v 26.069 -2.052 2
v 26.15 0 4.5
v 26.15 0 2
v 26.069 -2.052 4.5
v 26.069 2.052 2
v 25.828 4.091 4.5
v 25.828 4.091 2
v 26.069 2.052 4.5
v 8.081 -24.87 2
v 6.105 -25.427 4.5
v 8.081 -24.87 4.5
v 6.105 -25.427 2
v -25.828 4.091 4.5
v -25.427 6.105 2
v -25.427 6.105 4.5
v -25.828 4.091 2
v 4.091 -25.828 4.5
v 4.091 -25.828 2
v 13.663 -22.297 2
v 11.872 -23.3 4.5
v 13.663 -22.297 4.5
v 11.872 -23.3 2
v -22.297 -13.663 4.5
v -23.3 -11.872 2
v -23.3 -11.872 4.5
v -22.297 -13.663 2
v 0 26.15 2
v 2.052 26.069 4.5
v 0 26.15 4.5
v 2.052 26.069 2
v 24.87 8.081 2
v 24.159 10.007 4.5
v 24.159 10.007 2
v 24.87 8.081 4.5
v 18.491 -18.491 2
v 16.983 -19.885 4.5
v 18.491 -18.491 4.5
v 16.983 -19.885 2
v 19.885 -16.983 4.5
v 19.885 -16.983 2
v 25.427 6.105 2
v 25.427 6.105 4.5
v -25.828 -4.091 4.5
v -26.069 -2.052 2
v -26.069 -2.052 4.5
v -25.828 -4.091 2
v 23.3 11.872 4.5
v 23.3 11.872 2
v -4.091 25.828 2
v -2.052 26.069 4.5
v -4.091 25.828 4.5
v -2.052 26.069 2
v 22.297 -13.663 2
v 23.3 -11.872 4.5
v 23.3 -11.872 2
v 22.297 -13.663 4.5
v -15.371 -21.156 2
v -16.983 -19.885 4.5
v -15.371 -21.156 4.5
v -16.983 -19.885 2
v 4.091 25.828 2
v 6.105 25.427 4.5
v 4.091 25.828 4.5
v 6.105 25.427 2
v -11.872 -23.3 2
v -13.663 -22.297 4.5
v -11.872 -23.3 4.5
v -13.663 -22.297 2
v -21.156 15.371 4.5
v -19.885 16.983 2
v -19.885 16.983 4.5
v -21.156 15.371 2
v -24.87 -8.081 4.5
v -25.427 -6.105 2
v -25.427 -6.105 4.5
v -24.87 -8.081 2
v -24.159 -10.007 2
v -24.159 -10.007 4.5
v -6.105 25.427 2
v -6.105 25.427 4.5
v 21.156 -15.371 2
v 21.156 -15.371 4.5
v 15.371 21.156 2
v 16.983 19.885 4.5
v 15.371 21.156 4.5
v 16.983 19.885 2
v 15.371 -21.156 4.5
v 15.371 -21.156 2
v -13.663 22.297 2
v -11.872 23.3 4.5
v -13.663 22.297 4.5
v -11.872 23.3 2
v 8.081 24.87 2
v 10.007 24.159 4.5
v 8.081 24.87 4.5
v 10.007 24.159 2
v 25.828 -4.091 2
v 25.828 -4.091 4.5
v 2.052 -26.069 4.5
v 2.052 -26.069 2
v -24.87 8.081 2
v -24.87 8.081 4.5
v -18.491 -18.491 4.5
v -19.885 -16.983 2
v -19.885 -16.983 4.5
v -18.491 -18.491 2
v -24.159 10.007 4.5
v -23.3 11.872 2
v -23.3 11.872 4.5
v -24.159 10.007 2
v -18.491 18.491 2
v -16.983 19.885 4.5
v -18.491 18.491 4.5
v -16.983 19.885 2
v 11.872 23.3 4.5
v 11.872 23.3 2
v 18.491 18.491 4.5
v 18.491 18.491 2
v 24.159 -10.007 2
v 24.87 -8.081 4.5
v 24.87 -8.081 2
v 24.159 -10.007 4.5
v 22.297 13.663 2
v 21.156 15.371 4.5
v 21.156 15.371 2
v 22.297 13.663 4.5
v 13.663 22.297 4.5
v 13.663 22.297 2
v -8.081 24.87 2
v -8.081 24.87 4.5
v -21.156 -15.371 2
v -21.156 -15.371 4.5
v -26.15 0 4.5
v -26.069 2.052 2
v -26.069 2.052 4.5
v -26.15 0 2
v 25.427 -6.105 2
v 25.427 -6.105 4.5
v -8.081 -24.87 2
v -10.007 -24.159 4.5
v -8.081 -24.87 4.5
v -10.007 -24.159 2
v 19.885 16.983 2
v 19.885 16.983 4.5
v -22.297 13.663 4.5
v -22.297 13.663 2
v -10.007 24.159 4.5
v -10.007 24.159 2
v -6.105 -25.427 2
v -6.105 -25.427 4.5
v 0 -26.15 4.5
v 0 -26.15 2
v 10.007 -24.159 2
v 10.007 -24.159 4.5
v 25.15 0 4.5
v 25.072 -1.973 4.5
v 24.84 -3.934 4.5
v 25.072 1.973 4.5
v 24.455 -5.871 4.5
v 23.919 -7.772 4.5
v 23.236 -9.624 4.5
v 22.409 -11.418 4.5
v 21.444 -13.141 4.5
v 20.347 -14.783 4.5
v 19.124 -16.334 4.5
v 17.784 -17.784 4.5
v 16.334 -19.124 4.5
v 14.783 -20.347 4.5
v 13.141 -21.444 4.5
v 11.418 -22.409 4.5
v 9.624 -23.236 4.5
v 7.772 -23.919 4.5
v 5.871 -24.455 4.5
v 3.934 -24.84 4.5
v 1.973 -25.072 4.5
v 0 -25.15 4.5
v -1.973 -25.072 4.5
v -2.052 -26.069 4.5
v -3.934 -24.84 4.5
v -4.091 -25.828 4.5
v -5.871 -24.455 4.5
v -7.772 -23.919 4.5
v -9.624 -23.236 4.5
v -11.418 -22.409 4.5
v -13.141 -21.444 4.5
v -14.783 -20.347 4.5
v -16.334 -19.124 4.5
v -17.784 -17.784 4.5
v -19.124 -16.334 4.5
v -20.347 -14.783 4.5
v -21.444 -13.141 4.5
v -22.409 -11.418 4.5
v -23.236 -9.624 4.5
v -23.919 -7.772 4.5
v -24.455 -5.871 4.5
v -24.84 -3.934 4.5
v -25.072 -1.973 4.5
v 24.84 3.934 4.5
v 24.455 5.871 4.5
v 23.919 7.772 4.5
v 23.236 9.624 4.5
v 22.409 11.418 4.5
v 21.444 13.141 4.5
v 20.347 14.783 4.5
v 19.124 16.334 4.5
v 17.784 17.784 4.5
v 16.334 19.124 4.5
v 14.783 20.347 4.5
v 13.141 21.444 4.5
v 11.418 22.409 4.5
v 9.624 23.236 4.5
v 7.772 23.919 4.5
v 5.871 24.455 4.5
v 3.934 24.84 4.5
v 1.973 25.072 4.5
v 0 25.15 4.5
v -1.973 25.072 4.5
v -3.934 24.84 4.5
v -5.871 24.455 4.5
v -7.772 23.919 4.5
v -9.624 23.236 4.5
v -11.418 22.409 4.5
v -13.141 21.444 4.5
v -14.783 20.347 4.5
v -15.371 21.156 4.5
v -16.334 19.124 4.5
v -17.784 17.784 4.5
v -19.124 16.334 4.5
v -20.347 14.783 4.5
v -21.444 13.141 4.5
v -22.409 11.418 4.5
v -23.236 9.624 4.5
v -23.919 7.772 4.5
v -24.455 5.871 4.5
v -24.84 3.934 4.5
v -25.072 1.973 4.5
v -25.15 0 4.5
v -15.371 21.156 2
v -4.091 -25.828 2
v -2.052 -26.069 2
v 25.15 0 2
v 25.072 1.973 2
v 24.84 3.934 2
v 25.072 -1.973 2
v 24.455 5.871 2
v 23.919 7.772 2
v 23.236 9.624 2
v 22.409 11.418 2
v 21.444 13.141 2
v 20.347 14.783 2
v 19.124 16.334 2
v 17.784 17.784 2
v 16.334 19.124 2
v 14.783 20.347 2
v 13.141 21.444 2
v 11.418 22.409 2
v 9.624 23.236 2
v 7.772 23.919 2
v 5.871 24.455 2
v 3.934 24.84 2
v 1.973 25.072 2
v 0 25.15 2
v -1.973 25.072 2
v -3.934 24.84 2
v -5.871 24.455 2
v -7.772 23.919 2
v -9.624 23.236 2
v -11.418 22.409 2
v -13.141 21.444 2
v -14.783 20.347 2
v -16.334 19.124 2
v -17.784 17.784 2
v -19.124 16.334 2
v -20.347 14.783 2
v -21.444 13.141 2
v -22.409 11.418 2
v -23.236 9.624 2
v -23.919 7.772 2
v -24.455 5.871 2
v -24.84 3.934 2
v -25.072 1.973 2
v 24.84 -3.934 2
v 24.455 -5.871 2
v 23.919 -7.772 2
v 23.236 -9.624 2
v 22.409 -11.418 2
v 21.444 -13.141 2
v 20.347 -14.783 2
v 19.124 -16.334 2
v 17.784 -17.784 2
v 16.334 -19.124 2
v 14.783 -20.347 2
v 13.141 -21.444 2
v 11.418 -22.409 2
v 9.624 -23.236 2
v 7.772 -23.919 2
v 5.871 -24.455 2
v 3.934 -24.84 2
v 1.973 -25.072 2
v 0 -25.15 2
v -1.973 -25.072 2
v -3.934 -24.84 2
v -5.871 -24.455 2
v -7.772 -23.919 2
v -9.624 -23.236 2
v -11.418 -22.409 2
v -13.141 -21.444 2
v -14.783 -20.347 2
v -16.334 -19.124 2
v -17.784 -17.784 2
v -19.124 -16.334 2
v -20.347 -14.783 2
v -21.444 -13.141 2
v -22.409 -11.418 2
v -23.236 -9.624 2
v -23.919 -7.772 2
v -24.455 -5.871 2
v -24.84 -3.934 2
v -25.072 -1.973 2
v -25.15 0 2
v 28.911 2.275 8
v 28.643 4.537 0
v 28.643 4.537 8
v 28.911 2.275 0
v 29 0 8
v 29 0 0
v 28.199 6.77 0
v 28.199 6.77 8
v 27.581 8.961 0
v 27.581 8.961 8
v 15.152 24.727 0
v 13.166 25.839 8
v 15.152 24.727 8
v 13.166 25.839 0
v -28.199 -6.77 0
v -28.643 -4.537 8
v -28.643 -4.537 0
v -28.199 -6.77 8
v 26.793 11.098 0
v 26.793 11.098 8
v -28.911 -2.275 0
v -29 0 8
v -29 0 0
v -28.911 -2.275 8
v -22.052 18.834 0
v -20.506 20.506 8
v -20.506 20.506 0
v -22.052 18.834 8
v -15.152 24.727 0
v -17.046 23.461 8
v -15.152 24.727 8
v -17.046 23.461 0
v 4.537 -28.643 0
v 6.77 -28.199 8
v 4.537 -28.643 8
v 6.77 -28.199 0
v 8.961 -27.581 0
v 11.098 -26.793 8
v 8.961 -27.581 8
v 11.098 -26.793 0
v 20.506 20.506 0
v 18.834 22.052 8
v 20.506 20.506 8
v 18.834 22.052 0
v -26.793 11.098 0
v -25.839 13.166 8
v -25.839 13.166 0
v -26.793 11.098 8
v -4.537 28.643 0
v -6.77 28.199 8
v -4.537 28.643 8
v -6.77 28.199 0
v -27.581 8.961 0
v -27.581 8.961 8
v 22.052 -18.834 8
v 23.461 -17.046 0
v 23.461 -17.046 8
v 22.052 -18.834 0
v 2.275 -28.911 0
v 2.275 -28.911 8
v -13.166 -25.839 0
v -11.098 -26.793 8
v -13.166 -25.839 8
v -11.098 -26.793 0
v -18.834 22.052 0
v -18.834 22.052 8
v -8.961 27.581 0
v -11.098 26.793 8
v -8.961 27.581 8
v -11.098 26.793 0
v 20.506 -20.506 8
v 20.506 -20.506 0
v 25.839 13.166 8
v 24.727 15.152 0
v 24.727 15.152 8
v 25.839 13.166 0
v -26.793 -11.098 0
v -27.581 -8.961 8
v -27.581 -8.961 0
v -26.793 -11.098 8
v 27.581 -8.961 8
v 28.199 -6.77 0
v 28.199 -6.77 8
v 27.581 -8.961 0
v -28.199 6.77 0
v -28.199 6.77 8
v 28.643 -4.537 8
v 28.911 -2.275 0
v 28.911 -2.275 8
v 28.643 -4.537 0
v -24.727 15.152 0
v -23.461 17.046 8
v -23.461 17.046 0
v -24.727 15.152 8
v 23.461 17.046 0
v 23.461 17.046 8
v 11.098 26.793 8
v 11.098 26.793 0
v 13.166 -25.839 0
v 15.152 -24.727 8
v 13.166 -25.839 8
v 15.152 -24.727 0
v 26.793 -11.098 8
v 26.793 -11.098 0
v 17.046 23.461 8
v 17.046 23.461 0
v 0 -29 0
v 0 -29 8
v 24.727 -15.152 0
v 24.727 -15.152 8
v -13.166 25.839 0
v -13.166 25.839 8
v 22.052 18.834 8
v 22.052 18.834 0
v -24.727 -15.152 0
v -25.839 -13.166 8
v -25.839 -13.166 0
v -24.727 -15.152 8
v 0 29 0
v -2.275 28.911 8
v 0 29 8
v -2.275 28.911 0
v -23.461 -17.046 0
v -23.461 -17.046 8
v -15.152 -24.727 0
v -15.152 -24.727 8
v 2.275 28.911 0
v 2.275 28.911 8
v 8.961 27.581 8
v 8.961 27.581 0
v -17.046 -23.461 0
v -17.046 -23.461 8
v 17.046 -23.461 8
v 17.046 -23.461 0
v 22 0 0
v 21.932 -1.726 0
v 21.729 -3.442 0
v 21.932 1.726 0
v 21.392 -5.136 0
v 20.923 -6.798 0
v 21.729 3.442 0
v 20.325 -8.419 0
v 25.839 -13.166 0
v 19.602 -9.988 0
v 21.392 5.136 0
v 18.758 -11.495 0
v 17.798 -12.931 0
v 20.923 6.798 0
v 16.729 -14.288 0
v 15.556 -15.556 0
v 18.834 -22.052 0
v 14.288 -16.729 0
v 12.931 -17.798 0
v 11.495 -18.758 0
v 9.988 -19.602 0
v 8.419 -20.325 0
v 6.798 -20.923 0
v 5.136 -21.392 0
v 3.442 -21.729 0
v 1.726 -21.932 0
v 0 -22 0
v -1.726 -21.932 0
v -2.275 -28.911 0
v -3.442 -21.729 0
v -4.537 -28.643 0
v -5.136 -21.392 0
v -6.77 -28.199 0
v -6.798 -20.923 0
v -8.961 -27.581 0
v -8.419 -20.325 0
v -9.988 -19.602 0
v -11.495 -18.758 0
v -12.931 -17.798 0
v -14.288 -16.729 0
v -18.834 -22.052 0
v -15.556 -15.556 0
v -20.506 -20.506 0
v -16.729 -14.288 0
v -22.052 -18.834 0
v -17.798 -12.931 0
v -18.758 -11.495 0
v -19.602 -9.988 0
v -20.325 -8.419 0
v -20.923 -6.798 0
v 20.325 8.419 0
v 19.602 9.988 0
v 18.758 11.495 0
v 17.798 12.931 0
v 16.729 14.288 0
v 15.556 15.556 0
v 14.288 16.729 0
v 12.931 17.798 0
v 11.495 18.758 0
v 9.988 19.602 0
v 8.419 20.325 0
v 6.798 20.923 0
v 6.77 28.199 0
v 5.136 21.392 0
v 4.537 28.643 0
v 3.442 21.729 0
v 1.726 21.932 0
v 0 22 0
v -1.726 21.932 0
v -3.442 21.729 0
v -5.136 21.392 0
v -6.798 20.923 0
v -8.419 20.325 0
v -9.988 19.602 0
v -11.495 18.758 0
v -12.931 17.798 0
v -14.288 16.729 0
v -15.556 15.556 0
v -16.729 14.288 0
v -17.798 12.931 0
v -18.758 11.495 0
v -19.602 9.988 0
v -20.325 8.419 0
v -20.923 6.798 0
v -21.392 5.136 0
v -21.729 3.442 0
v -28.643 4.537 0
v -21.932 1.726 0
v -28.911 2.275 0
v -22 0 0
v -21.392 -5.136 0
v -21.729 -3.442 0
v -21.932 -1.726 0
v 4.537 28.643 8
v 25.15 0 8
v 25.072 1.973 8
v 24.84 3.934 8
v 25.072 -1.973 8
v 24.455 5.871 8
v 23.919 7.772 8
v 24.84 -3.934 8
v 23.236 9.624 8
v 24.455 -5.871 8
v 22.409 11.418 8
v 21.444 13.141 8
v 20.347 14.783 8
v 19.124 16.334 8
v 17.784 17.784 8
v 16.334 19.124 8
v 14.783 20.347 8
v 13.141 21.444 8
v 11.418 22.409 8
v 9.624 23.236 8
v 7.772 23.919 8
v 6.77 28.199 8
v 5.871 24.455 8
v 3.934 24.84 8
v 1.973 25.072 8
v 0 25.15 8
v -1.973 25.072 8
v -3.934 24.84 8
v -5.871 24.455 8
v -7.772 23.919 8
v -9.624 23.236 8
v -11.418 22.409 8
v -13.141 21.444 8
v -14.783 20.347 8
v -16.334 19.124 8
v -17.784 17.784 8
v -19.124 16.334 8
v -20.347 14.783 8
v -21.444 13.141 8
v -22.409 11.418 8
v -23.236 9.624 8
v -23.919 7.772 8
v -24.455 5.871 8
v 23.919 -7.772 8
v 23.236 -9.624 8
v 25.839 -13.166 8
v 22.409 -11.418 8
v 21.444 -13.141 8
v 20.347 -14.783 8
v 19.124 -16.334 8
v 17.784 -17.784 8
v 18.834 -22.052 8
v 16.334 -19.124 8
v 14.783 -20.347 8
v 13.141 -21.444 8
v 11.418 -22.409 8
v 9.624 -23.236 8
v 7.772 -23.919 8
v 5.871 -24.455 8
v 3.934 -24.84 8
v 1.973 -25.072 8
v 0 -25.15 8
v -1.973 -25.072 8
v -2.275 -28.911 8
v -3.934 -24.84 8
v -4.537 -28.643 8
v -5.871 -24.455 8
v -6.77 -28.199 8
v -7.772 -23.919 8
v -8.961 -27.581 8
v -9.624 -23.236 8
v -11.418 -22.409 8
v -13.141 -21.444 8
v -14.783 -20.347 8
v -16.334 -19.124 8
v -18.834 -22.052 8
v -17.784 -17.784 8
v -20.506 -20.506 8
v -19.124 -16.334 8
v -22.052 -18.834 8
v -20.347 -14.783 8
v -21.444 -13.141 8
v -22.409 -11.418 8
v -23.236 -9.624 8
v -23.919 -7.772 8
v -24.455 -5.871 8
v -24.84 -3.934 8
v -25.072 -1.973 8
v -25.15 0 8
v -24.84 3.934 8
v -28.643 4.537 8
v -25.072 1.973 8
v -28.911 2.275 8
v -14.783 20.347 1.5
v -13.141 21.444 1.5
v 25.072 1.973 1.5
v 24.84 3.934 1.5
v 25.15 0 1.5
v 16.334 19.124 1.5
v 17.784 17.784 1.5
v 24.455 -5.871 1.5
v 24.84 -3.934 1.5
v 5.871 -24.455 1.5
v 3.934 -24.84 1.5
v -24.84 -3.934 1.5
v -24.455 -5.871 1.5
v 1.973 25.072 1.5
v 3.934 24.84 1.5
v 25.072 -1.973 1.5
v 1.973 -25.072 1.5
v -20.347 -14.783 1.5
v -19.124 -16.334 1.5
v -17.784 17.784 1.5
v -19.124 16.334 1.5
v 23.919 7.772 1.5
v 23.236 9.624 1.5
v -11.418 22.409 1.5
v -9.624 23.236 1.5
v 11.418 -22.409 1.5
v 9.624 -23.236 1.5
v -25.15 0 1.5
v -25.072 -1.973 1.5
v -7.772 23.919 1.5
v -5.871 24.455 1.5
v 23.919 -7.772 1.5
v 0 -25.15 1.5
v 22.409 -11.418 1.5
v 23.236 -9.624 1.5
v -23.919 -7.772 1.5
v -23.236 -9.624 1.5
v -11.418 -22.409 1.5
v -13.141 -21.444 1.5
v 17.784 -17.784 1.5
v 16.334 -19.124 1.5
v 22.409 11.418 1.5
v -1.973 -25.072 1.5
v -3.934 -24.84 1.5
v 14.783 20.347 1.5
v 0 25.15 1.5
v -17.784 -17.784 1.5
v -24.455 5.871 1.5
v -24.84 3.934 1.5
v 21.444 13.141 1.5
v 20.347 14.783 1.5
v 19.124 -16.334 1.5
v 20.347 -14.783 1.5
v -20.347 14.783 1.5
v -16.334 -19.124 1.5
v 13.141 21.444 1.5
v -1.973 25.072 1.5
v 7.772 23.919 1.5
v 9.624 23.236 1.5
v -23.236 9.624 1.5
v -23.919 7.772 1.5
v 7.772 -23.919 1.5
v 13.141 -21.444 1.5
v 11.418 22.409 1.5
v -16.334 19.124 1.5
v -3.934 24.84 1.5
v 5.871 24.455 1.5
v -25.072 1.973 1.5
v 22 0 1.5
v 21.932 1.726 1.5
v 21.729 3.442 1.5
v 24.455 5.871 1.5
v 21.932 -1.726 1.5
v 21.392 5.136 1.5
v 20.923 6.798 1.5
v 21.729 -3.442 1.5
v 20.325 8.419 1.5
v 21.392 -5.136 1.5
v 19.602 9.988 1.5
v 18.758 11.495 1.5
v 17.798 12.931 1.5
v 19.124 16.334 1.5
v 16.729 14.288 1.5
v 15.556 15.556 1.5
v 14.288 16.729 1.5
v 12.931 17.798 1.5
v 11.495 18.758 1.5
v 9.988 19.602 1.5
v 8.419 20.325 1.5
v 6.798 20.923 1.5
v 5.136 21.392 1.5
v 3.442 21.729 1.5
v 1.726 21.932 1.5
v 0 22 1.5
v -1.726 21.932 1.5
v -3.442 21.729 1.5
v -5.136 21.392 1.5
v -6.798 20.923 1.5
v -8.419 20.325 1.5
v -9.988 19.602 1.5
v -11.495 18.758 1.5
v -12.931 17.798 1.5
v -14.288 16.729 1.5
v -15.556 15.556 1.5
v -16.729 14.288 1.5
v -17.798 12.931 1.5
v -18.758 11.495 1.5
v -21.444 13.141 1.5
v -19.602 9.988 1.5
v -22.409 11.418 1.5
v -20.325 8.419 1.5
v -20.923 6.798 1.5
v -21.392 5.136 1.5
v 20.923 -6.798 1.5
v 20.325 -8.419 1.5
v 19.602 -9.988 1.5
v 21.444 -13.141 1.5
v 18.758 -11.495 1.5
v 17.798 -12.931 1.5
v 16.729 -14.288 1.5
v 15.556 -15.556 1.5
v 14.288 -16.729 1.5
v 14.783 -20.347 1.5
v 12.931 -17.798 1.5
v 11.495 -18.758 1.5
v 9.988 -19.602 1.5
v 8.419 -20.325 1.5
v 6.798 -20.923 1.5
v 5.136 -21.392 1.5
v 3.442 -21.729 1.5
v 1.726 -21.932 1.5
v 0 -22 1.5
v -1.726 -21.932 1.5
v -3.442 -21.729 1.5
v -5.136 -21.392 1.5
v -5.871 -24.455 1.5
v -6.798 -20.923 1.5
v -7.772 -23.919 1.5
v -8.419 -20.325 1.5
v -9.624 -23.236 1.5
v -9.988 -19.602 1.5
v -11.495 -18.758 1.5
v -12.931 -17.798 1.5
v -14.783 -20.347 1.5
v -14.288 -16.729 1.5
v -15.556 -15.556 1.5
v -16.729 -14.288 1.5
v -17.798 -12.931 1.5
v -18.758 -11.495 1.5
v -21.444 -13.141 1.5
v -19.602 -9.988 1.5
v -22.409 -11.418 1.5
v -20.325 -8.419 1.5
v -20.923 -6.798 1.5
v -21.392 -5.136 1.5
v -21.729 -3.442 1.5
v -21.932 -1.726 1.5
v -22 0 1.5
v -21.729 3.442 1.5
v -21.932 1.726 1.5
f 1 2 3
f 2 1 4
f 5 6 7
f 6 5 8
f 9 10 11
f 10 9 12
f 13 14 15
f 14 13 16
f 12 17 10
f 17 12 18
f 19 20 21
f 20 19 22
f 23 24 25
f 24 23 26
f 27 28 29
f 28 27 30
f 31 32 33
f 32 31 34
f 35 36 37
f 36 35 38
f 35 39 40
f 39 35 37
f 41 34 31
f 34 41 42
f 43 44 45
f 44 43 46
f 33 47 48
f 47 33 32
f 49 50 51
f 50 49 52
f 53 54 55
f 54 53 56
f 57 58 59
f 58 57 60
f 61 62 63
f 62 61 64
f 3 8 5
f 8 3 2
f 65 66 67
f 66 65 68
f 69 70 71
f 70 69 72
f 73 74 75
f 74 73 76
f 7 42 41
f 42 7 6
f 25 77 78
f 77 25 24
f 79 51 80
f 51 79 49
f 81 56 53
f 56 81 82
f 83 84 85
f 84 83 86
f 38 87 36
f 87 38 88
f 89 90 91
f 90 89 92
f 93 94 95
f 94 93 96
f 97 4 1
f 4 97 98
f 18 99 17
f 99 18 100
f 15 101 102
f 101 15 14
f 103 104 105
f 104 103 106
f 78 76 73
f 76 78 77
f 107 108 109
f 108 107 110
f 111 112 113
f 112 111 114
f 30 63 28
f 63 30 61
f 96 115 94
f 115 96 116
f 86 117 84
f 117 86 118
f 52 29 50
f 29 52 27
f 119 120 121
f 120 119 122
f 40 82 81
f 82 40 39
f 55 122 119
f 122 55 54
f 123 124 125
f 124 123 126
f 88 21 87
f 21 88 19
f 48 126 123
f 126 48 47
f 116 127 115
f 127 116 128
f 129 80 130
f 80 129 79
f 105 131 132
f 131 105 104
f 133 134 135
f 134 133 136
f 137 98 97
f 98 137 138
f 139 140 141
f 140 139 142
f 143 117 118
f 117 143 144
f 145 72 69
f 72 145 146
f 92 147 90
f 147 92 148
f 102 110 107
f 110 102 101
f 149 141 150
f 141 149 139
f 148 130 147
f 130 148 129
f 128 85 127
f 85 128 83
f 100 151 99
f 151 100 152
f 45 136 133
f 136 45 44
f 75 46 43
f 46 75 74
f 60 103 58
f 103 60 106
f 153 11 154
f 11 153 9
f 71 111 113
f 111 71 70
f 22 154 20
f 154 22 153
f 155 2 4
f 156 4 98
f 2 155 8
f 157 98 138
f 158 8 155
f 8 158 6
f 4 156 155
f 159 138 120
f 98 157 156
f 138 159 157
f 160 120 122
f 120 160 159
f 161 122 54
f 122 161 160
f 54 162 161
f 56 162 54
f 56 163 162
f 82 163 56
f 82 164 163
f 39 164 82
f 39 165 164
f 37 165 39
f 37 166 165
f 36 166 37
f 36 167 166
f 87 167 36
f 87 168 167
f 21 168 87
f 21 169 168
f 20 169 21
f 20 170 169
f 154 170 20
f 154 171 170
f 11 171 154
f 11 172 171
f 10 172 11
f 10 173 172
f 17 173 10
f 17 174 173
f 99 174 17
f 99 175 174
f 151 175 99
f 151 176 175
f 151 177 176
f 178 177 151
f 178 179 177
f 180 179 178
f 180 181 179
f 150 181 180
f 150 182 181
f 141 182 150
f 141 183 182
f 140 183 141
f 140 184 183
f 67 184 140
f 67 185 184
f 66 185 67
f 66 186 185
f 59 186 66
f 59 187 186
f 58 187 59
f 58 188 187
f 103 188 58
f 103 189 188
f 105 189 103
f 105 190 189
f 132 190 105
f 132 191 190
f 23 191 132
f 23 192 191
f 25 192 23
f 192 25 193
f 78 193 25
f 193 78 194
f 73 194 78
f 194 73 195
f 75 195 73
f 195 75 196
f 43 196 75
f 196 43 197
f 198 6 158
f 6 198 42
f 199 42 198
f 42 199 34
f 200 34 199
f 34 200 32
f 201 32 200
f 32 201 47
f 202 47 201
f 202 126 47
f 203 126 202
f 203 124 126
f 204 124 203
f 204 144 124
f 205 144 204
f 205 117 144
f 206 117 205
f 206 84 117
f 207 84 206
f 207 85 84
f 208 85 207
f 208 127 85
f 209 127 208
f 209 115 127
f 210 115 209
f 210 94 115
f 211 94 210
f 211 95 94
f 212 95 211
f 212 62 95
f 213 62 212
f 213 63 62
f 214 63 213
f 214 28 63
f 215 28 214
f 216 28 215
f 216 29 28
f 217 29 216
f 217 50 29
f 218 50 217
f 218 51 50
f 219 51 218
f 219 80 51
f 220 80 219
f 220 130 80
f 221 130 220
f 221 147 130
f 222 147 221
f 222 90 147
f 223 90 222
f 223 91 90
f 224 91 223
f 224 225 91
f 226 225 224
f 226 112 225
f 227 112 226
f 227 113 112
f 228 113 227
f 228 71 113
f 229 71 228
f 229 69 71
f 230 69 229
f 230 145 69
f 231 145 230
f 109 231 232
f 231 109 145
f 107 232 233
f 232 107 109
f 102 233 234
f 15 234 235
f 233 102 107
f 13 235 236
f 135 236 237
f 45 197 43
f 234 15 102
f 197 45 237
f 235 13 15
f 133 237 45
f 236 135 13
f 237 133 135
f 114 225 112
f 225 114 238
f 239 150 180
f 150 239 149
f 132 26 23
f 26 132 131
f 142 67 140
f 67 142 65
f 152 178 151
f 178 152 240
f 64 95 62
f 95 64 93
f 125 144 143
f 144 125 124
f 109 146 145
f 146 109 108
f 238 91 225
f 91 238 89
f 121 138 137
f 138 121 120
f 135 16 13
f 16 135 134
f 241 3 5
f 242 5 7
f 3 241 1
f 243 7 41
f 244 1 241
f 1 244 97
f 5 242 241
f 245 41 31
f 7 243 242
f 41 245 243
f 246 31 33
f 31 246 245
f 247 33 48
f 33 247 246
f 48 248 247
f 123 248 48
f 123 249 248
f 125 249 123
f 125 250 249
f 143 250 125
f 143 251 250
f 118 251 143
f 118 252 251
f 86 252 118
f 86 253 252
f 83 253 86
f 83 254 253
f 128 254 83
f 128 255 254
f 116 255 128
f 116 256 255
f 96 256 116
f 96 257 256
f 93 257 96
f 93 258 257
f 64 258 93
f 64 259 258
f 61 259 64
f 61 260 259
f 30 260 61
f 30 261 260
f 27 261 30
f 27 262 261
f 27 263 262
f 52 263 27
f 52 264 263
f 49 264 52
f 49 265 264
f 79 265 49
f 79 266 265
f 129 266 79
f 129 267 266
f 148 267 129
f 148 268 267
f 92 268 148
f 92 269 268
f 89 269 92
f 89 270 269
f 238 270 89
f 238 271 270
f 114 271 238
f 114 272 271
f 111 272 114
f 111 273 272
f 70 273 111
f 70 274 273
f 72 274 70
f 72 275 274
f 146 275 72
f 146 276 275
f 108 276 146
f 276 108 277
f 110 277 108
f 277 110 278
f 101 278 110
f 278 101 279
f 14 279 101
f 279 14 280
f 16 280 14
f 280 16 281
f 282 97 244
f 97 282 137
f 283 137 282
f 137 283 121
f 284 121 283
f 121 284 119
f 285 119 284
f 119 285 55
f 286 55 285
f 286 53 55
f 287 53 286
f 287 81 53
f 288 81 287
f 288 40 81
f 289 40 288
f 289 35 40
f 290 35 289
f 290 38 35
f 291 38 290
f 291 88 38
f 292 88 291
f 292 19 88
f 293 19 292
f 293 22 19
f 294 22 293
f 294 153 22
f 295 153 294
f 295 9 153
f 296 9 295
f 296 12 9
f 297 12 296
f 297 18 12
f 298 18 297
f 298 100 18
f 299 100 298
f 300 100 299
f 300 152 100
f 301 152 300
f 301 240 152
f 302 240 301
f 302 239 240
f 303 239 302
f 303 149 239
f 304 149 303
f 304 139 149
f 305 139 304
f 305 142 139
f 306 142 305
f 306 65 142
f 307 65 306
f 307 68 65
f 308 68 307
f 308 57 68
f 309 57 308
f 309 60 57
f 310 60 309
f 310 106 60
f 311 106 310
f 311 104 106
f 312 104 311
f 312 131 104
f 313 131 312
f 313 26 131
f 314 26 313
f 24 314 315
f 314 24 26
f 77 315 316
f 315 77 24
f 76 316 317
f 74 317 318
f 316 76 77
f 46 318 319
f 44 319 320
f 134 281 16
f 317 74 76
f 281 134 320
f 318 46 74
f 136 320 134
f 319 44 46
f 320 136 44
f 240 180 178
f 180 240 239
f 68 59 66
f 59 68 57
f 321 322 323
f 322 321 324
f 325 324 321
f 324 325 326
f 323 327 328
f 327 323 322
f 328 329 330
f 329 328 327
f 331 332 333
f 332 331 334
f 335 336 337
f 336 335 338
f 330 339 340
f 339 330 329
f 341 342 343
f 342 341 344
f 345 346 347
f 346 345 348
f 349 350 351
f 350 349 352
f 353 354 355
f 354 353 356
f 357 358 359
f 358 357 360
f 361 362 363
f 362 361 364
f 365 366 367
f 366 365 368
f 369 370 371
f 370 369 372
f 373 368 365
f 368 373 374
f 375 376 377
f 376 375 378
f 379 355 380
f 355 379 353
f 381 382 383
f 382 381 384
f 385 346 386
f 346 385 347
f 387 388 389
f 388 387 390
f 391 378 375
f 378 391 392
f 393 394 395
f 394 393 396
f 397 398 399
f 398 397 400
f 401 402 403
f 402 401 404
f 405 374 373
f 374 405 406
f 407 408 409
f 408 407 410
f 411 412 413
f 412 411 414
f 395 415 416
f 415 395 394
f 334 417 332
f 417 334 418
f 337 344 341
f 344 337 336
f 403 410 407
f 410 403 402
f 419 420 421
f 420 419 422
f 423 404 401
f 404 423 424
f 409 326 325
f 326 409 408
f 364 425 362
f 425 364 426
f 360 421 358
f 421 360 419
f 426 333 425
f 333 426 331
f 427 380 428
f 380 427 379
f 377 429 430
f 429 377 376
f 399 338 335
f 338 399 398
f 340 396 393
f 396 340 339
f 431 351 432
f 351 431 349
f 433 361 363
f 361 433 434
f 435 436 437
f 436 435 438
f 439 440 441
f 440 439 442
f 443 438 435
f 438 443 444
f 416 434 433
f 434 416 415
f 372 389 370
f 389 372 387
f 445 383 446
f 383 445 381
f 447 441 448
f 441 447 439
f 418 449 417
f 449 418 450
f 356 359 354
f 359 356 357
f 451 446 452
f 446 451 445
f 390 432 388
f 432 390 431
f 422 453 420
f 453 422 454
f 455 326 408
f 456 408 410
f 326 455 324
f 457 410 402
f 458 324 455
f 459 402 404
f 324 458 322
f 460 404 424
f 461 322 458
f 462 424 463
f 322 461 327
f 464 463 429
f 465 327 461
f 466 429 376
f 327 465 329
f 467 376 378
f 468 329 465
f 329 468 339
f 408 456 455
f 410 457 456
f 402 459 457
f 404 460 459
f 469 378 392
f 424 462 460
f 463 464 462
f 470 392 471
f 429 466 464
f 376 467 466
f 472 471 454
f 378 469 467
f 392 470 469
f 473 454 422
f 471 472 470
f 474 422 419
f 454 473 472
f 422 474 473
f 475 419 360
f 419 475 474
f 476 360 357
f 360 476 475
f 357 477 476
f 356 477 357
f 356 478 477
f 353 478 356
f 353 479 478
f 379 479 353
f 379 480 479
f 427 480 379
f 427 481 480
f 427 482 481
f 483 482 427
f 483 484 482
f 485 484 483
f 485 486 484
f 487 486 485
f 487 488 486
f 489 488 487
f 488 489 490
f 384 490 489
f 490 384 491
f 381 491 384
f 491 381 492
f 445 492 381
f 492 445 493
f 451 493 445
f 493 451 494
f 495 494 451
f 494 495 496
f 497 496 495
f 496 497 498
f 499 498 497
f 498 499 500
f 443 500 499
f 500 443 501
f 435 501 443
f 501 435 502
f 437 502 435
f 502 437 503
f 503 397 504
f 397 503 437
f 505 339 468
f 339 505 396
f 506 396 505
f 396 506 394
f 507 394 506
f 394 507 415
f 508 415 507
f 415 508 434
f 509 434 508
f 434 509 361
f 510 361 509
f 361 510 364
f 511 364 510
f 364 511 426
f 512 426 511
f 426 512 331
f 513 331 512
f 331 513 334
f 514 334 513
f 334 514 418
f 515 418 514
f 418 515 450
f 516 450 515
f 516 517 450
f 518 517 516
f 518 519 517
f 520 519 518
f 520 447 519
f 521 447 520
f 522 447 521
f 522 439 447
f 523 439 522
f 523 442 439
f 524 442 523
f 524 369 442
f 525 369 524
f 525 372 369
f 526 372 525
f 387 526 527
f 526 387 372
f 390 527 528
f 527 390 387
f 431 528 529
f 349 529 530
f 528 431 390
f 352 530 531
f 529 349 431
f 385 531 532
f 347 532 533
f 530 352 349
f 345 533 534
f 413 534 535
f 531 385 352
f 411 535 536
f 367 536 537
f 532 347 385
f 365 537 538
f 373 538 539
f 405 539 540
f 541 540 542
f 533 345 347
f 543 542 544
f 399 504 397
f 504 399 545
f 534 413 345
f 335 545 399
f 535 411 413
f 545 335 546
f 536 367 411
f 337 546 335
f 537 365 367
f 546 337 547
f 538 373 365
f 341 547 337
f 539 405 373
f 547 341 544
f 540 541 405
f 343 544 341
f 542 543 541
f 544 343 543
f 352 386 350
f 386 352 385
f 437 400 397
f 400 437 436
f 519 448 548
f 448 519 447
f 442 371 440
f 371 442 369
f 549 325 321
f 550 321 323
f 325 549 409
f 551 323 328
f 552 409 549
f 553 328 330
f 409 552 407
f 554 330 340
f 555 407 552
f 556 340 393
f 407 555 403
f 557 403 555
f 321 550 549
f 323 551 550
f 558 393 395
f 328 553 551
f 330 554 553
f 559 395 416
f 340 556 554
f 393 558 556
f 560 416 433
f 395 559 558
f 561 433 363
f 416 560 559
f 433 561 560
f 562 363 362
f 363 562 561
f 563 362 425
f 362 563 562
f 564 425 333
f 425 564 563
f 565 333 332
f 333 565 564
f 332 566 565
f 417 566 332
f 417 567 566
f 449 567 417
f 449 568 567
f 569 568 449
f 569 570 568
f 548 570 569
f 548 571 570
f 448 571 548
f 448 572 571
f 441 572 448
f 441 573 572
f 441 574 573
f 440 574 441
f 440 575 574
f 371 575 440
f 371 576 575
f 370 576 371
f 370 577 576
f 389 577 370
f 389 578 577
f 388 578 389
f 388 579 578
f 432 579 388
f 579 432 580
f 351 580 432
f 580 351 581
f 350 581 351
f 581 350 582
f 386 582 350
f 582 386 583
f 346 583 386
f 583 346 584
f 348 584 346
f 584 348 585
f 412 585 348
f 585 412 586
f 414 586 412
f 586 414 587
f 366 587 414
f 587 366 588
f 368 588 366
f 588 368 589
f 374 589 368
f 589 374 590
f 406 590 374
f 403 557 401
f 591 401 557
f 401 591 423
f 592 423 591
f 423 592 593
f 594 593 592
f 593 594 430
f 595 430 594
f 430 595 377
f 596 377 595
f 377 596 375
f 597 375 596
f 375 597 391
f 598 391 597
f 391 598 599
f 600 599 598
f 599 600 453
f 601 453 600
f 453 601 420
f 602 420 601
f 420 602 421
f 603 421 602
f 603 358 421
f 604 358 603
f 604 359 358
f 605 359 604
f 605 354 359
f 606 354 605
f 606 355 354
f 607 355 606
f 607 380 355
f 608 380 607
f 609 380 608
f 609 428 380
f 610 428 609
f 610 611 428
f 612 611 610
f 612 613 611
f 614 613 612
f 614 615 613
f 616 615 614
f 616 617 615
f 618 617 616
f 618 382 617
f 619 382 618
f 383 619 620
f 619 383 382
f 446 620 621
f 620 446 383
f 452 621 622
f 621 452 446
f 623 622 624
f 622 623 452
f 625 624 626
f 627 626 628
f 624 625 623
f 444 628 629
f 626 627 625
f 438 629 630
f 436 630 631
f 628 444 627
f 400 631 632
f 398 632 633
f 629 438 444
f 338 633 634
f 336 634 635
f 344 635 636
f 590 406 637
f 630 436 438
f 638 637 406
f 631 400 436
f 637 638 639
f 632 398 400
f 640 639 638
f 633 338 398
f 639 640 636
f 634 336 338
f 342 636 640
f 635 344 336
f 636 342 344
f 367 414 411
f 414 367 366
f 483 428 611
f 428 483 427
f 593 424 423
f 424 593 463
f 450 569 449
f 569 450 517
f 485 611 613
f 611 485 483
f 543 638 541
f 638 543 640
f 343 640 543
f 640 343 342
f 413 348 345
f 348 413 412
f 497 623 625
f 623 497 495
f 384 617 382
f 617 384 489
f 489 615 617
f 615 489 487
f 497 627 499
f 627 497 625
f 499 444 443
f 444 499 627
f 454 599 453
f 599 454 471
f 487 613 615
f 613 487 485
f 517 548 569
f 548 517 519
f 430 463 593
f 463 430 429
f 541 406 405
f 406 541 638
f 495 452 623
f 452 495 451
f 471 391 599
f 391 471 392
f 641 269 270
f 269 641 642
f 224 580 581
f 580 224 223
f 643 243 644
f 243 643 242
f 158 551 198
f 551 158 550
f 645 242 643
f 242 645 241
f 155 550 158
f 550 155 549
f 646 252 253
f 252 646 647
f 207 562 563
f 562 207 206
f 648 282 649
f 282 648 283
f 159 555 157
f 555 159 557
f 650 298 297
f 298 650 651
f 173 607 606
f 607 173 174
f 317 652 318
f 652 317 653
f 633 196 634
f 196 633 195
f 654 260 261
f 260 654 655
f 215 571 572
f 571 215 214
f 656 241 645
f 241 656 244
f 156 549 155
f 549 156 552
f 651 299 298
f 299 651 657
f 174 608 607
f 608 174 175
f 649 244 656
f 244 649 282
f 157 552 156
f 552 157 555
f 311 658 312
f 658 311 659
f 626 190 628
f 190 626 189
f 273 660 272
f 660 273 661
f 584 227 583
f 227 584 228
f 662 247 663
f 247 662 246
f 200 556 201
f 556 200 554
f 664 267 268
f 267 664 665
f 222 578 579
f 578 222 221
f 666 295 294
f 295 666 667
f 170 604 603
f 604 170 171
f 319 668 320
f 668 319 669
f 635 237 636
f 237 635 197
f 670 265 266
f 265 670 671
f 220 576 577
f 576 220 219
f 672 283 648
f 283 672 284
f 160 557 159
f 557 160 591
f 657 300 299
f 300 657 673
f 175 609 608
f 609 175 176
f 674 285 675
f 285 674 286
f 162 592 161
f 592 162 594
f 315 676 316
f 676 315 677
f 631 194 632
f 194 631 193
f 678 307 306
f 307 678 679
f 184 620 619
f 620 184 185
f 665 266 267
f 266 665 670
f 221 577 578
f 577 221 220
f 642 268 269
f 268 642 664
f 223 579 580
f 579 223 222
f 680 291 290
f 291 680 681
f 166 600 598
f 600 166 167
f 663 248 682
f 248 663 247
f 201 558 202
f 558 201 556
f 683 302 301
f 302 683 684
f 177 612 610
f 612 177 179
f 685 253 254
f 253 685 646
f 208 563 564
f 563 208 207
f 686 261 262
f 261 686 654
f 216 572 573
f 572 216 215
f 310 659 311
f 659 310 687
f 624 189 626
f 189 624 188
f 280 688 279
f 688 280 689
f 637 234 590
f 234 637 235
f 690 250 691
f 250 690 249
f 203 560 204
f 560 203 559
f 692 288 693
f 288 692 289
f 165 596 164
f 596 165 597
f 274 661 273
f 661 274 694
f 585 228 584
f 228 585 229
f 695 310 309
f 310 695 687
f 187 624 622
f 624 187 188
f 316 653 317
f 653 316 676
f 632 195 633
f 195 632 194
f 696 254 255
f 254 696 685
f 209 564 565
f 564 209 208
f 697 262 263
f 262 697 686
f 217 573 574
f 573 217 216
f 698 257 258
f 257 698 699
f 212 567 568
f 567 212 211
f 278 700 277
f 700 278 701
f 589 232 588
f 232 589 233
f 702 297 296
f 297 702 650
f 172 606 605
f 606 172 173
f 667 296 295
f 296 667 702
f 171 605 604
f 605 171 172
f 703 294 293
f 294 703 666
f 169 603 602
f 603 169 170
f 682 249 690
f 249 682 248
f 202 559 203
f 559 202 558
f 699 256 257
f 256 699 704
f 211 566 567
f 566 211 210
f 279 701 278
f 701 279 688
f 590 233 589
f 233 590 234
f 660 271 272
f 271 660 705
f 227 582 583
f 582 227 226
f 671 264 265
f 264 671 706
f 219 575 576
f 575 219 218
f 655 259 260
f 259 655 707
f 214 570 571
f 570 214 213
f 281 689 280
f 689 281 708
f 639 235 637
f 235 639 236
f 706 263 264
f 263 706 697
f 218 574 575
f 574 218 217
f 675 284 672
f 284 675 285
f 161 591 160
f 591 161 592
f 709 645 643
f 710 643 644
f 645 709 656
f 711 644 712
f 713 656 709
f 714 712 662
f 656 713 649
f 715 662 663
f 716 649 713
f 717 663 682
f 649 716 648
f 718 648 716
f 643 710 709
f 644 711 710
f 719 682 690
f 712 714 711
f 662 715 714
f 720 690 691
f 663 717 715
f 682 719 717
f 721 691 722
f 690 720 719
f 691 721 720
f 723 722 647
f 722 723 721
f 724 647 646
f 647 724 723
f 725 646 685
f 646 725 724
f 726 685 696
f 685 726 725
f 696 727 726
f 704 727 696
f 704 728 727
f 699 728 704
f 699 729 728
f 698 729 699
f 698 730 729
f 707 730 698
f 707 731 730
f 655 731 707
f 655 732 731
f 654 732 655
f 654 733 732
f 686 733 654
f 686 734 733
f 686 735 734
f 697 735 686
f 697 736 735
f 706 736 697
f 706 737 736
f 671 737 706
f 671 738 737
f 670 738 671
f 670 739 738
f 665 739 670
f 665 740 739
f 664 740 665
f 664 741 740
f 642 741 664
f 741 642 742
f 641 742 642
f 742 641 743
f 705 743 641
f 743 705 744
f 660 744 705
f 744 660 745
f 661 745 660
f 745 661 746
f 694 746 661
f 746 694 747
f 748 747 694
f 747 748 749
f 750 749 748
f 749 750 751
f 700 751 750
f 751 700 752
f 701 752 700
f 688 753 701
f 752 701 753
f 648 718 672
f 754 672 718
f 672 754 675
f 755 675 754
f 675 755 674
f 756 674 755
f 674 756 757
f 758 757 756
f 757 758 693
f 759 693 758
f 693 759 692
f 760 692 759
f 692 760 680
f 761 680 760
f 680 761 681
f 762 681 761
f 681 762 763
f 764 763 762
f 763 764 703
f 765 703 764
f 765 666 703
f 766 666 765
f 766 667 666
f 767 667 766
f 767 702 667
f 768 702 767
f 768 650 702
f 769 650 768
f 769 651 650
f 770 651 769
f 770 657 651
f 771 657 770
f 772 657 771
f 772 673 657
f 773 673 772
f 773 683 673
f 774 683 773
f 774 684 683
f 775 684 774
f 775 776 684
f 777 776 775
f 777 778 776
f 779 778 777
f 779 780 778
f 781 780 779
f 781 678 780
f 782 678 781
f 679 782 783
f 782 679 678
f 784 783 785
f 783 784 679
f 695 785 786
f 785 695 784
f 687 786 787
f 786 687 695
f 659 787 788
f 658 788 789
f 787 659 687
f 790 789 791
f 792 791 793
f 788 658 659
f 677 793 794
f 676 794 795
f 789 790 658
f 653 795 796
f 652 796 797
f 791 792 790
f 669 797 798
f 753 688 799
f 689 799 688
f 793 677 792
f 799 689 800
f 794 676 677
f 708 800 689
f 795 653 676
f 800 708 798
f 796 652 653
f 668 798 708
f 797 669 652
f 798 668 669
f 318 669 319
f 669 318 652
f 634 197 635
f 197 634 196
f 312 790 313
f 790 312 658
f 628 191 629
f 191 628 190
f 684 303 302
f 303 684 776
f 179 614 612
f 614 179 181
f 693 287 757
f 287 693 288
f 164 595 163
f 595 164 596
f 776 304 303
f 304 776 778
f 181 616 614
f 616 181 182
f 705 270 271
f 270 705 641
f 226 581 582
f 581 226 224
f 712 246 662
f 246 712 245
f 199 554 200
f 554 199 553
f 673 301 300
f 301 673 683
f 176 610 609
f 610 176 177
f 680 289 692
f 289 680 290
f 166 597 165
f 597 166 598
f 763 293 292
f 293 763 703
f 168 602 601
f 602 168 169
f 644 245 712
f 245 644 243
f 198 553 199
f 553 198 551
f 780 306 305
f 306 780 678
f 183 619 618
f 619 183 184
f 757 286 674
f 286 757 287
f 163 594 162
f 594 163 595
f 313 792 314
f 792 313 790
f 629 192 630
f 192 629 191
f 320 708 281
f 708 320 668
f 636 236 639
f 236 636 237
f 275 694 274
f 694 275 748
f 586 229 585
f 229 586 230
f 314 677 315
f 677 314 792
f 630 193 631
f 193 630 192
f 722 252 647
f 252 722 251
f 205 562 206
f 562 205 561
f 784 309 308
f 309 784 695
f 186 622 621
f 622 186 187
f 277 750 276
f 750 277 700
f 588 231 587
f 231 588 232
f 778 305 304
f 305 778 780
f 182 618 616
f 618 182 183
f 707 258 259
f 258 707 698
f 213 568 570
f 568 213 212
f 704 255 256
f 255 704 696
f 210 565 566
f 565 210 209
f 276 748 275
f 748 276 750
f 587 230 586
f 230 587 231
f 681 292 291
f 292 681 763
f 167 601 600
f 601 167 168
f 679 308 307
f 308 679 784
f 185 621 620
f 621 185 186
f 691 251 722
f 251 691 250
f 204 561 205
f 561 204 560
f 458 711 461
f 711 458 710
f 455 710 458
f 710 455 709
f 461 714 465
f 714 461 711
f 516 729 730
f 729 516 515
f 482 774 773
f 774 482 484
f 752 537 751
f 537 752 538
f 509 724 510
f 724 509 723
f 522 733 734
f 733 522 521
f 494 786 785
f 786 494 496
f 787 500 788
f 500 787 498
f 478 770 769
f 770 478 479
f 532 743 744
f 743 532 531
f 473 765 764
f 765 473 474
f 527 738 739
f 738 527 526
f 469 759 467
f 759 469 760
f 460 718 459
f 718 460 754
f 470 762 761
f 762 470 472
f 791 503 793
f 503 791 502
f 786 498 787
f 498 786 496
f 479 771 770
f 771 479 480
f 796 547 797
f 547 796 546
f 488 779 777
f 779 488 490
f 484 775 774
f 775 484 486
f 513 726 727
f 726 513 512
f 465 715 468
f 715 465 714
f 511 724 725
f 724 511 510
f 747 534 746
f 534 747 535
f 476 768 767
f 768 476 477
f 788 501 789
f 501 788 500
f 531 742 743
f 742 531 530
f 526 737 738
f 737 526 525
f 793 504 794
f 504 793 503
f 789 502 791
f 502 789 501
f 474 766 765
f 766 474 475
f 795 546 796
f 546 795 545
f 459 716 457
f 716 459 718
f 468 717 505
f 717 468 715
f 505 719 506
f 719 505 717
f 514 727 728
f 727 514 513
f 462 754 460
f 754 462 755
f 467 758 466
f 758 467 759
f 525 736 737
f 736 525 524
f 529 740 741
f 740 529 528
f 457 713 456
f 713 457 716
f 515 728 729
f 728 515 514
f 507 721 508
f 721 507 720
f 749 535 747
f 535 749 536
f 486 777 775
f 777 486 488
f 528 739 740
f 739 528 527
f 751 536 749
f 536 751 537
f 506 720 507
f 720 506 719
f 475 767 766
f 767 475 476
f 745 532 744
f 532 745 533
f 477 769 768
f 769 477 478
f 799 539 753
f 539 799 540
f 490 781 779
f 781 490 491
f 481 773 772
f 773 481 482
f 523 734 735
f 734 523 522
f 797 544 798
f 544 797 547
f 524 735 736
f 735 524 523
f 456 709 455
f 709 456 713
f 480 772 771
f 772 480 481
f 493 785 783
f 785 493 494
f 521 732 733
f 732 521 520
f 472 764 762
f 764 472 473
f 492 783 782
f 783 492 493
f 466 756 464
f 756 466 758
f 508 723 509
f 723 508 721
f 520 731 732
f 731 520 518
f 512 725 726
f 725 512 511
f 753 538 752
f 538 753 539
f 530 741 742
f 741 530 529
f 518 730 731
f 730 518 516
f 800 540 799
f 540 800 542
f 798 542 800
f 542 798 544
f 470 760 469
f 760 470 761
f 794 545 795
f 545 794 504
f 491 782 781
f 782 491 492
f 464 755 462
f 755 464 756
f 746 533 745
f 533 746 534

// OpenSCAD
// ============================================================
// PART 5: Lens Window Retainer Ring
// Holds the 50mm acrylic disc + O-ring over the scout camera
// aperture hole in the IP67 enclosure lid. Threaded or press-fit.
//
// Print: PETG, 100% infill, 0.15mm layer height
// Hardware: Acrylic disc (50mm x 3mm), O-ring (~45mm ID)
// Note: This part does NOT replace buying the acrylic disc,
//       but provides the frame to seat and seal it.
// ============================================================

// --- Parameters ---
window_dia      = 50;    // mm — acrylic disc diameter
window_thick    = 3;     // mm — acrylic disc thickness
oring_groove_d  = 45;    // mm — O-ring inner diameter
oring_cs        = 2;     // mm — O-ring cross-section diameter
ring_wall       = 4;     // mm — wall around window
ring_height     = 8;     // mm — total ring height
lip_height      = 1.5;   // mm — inner lip that holds disc from falling

ring_od = window_dia + ring_wall * 2;
ring_id = window_dia + 0.3;  // slight clearance for disc

$fn = 80;

module retainer_ring() {
    difference() {
        // Outer ring body
        cylinder(h = ring_height, d = ring_od);
        
        // Window bore (disc sits here)
        translate([0, 0, lip_height])
            cylinder(h = ring_height, d = ring_id);
        
        // Viewing aperture through the lip
        translate([0, 0, -1])
            cylinder(h = lip_height + 2, d = window_dia - 6);
        
        // O-ring groove (cut into the bore wall at disc seating level)
        translate([0, 0, lip_height + 0.5])
            difference() {
                cylinder(h = oring_cs + 0.5, d = ring_id + oring_cs);
                translate([0, 0, -0.1])
                    cylinder(h = oring_cs + 0.7, d = ring_id - 0.2);
            }
    }
}

retainer_ring();
